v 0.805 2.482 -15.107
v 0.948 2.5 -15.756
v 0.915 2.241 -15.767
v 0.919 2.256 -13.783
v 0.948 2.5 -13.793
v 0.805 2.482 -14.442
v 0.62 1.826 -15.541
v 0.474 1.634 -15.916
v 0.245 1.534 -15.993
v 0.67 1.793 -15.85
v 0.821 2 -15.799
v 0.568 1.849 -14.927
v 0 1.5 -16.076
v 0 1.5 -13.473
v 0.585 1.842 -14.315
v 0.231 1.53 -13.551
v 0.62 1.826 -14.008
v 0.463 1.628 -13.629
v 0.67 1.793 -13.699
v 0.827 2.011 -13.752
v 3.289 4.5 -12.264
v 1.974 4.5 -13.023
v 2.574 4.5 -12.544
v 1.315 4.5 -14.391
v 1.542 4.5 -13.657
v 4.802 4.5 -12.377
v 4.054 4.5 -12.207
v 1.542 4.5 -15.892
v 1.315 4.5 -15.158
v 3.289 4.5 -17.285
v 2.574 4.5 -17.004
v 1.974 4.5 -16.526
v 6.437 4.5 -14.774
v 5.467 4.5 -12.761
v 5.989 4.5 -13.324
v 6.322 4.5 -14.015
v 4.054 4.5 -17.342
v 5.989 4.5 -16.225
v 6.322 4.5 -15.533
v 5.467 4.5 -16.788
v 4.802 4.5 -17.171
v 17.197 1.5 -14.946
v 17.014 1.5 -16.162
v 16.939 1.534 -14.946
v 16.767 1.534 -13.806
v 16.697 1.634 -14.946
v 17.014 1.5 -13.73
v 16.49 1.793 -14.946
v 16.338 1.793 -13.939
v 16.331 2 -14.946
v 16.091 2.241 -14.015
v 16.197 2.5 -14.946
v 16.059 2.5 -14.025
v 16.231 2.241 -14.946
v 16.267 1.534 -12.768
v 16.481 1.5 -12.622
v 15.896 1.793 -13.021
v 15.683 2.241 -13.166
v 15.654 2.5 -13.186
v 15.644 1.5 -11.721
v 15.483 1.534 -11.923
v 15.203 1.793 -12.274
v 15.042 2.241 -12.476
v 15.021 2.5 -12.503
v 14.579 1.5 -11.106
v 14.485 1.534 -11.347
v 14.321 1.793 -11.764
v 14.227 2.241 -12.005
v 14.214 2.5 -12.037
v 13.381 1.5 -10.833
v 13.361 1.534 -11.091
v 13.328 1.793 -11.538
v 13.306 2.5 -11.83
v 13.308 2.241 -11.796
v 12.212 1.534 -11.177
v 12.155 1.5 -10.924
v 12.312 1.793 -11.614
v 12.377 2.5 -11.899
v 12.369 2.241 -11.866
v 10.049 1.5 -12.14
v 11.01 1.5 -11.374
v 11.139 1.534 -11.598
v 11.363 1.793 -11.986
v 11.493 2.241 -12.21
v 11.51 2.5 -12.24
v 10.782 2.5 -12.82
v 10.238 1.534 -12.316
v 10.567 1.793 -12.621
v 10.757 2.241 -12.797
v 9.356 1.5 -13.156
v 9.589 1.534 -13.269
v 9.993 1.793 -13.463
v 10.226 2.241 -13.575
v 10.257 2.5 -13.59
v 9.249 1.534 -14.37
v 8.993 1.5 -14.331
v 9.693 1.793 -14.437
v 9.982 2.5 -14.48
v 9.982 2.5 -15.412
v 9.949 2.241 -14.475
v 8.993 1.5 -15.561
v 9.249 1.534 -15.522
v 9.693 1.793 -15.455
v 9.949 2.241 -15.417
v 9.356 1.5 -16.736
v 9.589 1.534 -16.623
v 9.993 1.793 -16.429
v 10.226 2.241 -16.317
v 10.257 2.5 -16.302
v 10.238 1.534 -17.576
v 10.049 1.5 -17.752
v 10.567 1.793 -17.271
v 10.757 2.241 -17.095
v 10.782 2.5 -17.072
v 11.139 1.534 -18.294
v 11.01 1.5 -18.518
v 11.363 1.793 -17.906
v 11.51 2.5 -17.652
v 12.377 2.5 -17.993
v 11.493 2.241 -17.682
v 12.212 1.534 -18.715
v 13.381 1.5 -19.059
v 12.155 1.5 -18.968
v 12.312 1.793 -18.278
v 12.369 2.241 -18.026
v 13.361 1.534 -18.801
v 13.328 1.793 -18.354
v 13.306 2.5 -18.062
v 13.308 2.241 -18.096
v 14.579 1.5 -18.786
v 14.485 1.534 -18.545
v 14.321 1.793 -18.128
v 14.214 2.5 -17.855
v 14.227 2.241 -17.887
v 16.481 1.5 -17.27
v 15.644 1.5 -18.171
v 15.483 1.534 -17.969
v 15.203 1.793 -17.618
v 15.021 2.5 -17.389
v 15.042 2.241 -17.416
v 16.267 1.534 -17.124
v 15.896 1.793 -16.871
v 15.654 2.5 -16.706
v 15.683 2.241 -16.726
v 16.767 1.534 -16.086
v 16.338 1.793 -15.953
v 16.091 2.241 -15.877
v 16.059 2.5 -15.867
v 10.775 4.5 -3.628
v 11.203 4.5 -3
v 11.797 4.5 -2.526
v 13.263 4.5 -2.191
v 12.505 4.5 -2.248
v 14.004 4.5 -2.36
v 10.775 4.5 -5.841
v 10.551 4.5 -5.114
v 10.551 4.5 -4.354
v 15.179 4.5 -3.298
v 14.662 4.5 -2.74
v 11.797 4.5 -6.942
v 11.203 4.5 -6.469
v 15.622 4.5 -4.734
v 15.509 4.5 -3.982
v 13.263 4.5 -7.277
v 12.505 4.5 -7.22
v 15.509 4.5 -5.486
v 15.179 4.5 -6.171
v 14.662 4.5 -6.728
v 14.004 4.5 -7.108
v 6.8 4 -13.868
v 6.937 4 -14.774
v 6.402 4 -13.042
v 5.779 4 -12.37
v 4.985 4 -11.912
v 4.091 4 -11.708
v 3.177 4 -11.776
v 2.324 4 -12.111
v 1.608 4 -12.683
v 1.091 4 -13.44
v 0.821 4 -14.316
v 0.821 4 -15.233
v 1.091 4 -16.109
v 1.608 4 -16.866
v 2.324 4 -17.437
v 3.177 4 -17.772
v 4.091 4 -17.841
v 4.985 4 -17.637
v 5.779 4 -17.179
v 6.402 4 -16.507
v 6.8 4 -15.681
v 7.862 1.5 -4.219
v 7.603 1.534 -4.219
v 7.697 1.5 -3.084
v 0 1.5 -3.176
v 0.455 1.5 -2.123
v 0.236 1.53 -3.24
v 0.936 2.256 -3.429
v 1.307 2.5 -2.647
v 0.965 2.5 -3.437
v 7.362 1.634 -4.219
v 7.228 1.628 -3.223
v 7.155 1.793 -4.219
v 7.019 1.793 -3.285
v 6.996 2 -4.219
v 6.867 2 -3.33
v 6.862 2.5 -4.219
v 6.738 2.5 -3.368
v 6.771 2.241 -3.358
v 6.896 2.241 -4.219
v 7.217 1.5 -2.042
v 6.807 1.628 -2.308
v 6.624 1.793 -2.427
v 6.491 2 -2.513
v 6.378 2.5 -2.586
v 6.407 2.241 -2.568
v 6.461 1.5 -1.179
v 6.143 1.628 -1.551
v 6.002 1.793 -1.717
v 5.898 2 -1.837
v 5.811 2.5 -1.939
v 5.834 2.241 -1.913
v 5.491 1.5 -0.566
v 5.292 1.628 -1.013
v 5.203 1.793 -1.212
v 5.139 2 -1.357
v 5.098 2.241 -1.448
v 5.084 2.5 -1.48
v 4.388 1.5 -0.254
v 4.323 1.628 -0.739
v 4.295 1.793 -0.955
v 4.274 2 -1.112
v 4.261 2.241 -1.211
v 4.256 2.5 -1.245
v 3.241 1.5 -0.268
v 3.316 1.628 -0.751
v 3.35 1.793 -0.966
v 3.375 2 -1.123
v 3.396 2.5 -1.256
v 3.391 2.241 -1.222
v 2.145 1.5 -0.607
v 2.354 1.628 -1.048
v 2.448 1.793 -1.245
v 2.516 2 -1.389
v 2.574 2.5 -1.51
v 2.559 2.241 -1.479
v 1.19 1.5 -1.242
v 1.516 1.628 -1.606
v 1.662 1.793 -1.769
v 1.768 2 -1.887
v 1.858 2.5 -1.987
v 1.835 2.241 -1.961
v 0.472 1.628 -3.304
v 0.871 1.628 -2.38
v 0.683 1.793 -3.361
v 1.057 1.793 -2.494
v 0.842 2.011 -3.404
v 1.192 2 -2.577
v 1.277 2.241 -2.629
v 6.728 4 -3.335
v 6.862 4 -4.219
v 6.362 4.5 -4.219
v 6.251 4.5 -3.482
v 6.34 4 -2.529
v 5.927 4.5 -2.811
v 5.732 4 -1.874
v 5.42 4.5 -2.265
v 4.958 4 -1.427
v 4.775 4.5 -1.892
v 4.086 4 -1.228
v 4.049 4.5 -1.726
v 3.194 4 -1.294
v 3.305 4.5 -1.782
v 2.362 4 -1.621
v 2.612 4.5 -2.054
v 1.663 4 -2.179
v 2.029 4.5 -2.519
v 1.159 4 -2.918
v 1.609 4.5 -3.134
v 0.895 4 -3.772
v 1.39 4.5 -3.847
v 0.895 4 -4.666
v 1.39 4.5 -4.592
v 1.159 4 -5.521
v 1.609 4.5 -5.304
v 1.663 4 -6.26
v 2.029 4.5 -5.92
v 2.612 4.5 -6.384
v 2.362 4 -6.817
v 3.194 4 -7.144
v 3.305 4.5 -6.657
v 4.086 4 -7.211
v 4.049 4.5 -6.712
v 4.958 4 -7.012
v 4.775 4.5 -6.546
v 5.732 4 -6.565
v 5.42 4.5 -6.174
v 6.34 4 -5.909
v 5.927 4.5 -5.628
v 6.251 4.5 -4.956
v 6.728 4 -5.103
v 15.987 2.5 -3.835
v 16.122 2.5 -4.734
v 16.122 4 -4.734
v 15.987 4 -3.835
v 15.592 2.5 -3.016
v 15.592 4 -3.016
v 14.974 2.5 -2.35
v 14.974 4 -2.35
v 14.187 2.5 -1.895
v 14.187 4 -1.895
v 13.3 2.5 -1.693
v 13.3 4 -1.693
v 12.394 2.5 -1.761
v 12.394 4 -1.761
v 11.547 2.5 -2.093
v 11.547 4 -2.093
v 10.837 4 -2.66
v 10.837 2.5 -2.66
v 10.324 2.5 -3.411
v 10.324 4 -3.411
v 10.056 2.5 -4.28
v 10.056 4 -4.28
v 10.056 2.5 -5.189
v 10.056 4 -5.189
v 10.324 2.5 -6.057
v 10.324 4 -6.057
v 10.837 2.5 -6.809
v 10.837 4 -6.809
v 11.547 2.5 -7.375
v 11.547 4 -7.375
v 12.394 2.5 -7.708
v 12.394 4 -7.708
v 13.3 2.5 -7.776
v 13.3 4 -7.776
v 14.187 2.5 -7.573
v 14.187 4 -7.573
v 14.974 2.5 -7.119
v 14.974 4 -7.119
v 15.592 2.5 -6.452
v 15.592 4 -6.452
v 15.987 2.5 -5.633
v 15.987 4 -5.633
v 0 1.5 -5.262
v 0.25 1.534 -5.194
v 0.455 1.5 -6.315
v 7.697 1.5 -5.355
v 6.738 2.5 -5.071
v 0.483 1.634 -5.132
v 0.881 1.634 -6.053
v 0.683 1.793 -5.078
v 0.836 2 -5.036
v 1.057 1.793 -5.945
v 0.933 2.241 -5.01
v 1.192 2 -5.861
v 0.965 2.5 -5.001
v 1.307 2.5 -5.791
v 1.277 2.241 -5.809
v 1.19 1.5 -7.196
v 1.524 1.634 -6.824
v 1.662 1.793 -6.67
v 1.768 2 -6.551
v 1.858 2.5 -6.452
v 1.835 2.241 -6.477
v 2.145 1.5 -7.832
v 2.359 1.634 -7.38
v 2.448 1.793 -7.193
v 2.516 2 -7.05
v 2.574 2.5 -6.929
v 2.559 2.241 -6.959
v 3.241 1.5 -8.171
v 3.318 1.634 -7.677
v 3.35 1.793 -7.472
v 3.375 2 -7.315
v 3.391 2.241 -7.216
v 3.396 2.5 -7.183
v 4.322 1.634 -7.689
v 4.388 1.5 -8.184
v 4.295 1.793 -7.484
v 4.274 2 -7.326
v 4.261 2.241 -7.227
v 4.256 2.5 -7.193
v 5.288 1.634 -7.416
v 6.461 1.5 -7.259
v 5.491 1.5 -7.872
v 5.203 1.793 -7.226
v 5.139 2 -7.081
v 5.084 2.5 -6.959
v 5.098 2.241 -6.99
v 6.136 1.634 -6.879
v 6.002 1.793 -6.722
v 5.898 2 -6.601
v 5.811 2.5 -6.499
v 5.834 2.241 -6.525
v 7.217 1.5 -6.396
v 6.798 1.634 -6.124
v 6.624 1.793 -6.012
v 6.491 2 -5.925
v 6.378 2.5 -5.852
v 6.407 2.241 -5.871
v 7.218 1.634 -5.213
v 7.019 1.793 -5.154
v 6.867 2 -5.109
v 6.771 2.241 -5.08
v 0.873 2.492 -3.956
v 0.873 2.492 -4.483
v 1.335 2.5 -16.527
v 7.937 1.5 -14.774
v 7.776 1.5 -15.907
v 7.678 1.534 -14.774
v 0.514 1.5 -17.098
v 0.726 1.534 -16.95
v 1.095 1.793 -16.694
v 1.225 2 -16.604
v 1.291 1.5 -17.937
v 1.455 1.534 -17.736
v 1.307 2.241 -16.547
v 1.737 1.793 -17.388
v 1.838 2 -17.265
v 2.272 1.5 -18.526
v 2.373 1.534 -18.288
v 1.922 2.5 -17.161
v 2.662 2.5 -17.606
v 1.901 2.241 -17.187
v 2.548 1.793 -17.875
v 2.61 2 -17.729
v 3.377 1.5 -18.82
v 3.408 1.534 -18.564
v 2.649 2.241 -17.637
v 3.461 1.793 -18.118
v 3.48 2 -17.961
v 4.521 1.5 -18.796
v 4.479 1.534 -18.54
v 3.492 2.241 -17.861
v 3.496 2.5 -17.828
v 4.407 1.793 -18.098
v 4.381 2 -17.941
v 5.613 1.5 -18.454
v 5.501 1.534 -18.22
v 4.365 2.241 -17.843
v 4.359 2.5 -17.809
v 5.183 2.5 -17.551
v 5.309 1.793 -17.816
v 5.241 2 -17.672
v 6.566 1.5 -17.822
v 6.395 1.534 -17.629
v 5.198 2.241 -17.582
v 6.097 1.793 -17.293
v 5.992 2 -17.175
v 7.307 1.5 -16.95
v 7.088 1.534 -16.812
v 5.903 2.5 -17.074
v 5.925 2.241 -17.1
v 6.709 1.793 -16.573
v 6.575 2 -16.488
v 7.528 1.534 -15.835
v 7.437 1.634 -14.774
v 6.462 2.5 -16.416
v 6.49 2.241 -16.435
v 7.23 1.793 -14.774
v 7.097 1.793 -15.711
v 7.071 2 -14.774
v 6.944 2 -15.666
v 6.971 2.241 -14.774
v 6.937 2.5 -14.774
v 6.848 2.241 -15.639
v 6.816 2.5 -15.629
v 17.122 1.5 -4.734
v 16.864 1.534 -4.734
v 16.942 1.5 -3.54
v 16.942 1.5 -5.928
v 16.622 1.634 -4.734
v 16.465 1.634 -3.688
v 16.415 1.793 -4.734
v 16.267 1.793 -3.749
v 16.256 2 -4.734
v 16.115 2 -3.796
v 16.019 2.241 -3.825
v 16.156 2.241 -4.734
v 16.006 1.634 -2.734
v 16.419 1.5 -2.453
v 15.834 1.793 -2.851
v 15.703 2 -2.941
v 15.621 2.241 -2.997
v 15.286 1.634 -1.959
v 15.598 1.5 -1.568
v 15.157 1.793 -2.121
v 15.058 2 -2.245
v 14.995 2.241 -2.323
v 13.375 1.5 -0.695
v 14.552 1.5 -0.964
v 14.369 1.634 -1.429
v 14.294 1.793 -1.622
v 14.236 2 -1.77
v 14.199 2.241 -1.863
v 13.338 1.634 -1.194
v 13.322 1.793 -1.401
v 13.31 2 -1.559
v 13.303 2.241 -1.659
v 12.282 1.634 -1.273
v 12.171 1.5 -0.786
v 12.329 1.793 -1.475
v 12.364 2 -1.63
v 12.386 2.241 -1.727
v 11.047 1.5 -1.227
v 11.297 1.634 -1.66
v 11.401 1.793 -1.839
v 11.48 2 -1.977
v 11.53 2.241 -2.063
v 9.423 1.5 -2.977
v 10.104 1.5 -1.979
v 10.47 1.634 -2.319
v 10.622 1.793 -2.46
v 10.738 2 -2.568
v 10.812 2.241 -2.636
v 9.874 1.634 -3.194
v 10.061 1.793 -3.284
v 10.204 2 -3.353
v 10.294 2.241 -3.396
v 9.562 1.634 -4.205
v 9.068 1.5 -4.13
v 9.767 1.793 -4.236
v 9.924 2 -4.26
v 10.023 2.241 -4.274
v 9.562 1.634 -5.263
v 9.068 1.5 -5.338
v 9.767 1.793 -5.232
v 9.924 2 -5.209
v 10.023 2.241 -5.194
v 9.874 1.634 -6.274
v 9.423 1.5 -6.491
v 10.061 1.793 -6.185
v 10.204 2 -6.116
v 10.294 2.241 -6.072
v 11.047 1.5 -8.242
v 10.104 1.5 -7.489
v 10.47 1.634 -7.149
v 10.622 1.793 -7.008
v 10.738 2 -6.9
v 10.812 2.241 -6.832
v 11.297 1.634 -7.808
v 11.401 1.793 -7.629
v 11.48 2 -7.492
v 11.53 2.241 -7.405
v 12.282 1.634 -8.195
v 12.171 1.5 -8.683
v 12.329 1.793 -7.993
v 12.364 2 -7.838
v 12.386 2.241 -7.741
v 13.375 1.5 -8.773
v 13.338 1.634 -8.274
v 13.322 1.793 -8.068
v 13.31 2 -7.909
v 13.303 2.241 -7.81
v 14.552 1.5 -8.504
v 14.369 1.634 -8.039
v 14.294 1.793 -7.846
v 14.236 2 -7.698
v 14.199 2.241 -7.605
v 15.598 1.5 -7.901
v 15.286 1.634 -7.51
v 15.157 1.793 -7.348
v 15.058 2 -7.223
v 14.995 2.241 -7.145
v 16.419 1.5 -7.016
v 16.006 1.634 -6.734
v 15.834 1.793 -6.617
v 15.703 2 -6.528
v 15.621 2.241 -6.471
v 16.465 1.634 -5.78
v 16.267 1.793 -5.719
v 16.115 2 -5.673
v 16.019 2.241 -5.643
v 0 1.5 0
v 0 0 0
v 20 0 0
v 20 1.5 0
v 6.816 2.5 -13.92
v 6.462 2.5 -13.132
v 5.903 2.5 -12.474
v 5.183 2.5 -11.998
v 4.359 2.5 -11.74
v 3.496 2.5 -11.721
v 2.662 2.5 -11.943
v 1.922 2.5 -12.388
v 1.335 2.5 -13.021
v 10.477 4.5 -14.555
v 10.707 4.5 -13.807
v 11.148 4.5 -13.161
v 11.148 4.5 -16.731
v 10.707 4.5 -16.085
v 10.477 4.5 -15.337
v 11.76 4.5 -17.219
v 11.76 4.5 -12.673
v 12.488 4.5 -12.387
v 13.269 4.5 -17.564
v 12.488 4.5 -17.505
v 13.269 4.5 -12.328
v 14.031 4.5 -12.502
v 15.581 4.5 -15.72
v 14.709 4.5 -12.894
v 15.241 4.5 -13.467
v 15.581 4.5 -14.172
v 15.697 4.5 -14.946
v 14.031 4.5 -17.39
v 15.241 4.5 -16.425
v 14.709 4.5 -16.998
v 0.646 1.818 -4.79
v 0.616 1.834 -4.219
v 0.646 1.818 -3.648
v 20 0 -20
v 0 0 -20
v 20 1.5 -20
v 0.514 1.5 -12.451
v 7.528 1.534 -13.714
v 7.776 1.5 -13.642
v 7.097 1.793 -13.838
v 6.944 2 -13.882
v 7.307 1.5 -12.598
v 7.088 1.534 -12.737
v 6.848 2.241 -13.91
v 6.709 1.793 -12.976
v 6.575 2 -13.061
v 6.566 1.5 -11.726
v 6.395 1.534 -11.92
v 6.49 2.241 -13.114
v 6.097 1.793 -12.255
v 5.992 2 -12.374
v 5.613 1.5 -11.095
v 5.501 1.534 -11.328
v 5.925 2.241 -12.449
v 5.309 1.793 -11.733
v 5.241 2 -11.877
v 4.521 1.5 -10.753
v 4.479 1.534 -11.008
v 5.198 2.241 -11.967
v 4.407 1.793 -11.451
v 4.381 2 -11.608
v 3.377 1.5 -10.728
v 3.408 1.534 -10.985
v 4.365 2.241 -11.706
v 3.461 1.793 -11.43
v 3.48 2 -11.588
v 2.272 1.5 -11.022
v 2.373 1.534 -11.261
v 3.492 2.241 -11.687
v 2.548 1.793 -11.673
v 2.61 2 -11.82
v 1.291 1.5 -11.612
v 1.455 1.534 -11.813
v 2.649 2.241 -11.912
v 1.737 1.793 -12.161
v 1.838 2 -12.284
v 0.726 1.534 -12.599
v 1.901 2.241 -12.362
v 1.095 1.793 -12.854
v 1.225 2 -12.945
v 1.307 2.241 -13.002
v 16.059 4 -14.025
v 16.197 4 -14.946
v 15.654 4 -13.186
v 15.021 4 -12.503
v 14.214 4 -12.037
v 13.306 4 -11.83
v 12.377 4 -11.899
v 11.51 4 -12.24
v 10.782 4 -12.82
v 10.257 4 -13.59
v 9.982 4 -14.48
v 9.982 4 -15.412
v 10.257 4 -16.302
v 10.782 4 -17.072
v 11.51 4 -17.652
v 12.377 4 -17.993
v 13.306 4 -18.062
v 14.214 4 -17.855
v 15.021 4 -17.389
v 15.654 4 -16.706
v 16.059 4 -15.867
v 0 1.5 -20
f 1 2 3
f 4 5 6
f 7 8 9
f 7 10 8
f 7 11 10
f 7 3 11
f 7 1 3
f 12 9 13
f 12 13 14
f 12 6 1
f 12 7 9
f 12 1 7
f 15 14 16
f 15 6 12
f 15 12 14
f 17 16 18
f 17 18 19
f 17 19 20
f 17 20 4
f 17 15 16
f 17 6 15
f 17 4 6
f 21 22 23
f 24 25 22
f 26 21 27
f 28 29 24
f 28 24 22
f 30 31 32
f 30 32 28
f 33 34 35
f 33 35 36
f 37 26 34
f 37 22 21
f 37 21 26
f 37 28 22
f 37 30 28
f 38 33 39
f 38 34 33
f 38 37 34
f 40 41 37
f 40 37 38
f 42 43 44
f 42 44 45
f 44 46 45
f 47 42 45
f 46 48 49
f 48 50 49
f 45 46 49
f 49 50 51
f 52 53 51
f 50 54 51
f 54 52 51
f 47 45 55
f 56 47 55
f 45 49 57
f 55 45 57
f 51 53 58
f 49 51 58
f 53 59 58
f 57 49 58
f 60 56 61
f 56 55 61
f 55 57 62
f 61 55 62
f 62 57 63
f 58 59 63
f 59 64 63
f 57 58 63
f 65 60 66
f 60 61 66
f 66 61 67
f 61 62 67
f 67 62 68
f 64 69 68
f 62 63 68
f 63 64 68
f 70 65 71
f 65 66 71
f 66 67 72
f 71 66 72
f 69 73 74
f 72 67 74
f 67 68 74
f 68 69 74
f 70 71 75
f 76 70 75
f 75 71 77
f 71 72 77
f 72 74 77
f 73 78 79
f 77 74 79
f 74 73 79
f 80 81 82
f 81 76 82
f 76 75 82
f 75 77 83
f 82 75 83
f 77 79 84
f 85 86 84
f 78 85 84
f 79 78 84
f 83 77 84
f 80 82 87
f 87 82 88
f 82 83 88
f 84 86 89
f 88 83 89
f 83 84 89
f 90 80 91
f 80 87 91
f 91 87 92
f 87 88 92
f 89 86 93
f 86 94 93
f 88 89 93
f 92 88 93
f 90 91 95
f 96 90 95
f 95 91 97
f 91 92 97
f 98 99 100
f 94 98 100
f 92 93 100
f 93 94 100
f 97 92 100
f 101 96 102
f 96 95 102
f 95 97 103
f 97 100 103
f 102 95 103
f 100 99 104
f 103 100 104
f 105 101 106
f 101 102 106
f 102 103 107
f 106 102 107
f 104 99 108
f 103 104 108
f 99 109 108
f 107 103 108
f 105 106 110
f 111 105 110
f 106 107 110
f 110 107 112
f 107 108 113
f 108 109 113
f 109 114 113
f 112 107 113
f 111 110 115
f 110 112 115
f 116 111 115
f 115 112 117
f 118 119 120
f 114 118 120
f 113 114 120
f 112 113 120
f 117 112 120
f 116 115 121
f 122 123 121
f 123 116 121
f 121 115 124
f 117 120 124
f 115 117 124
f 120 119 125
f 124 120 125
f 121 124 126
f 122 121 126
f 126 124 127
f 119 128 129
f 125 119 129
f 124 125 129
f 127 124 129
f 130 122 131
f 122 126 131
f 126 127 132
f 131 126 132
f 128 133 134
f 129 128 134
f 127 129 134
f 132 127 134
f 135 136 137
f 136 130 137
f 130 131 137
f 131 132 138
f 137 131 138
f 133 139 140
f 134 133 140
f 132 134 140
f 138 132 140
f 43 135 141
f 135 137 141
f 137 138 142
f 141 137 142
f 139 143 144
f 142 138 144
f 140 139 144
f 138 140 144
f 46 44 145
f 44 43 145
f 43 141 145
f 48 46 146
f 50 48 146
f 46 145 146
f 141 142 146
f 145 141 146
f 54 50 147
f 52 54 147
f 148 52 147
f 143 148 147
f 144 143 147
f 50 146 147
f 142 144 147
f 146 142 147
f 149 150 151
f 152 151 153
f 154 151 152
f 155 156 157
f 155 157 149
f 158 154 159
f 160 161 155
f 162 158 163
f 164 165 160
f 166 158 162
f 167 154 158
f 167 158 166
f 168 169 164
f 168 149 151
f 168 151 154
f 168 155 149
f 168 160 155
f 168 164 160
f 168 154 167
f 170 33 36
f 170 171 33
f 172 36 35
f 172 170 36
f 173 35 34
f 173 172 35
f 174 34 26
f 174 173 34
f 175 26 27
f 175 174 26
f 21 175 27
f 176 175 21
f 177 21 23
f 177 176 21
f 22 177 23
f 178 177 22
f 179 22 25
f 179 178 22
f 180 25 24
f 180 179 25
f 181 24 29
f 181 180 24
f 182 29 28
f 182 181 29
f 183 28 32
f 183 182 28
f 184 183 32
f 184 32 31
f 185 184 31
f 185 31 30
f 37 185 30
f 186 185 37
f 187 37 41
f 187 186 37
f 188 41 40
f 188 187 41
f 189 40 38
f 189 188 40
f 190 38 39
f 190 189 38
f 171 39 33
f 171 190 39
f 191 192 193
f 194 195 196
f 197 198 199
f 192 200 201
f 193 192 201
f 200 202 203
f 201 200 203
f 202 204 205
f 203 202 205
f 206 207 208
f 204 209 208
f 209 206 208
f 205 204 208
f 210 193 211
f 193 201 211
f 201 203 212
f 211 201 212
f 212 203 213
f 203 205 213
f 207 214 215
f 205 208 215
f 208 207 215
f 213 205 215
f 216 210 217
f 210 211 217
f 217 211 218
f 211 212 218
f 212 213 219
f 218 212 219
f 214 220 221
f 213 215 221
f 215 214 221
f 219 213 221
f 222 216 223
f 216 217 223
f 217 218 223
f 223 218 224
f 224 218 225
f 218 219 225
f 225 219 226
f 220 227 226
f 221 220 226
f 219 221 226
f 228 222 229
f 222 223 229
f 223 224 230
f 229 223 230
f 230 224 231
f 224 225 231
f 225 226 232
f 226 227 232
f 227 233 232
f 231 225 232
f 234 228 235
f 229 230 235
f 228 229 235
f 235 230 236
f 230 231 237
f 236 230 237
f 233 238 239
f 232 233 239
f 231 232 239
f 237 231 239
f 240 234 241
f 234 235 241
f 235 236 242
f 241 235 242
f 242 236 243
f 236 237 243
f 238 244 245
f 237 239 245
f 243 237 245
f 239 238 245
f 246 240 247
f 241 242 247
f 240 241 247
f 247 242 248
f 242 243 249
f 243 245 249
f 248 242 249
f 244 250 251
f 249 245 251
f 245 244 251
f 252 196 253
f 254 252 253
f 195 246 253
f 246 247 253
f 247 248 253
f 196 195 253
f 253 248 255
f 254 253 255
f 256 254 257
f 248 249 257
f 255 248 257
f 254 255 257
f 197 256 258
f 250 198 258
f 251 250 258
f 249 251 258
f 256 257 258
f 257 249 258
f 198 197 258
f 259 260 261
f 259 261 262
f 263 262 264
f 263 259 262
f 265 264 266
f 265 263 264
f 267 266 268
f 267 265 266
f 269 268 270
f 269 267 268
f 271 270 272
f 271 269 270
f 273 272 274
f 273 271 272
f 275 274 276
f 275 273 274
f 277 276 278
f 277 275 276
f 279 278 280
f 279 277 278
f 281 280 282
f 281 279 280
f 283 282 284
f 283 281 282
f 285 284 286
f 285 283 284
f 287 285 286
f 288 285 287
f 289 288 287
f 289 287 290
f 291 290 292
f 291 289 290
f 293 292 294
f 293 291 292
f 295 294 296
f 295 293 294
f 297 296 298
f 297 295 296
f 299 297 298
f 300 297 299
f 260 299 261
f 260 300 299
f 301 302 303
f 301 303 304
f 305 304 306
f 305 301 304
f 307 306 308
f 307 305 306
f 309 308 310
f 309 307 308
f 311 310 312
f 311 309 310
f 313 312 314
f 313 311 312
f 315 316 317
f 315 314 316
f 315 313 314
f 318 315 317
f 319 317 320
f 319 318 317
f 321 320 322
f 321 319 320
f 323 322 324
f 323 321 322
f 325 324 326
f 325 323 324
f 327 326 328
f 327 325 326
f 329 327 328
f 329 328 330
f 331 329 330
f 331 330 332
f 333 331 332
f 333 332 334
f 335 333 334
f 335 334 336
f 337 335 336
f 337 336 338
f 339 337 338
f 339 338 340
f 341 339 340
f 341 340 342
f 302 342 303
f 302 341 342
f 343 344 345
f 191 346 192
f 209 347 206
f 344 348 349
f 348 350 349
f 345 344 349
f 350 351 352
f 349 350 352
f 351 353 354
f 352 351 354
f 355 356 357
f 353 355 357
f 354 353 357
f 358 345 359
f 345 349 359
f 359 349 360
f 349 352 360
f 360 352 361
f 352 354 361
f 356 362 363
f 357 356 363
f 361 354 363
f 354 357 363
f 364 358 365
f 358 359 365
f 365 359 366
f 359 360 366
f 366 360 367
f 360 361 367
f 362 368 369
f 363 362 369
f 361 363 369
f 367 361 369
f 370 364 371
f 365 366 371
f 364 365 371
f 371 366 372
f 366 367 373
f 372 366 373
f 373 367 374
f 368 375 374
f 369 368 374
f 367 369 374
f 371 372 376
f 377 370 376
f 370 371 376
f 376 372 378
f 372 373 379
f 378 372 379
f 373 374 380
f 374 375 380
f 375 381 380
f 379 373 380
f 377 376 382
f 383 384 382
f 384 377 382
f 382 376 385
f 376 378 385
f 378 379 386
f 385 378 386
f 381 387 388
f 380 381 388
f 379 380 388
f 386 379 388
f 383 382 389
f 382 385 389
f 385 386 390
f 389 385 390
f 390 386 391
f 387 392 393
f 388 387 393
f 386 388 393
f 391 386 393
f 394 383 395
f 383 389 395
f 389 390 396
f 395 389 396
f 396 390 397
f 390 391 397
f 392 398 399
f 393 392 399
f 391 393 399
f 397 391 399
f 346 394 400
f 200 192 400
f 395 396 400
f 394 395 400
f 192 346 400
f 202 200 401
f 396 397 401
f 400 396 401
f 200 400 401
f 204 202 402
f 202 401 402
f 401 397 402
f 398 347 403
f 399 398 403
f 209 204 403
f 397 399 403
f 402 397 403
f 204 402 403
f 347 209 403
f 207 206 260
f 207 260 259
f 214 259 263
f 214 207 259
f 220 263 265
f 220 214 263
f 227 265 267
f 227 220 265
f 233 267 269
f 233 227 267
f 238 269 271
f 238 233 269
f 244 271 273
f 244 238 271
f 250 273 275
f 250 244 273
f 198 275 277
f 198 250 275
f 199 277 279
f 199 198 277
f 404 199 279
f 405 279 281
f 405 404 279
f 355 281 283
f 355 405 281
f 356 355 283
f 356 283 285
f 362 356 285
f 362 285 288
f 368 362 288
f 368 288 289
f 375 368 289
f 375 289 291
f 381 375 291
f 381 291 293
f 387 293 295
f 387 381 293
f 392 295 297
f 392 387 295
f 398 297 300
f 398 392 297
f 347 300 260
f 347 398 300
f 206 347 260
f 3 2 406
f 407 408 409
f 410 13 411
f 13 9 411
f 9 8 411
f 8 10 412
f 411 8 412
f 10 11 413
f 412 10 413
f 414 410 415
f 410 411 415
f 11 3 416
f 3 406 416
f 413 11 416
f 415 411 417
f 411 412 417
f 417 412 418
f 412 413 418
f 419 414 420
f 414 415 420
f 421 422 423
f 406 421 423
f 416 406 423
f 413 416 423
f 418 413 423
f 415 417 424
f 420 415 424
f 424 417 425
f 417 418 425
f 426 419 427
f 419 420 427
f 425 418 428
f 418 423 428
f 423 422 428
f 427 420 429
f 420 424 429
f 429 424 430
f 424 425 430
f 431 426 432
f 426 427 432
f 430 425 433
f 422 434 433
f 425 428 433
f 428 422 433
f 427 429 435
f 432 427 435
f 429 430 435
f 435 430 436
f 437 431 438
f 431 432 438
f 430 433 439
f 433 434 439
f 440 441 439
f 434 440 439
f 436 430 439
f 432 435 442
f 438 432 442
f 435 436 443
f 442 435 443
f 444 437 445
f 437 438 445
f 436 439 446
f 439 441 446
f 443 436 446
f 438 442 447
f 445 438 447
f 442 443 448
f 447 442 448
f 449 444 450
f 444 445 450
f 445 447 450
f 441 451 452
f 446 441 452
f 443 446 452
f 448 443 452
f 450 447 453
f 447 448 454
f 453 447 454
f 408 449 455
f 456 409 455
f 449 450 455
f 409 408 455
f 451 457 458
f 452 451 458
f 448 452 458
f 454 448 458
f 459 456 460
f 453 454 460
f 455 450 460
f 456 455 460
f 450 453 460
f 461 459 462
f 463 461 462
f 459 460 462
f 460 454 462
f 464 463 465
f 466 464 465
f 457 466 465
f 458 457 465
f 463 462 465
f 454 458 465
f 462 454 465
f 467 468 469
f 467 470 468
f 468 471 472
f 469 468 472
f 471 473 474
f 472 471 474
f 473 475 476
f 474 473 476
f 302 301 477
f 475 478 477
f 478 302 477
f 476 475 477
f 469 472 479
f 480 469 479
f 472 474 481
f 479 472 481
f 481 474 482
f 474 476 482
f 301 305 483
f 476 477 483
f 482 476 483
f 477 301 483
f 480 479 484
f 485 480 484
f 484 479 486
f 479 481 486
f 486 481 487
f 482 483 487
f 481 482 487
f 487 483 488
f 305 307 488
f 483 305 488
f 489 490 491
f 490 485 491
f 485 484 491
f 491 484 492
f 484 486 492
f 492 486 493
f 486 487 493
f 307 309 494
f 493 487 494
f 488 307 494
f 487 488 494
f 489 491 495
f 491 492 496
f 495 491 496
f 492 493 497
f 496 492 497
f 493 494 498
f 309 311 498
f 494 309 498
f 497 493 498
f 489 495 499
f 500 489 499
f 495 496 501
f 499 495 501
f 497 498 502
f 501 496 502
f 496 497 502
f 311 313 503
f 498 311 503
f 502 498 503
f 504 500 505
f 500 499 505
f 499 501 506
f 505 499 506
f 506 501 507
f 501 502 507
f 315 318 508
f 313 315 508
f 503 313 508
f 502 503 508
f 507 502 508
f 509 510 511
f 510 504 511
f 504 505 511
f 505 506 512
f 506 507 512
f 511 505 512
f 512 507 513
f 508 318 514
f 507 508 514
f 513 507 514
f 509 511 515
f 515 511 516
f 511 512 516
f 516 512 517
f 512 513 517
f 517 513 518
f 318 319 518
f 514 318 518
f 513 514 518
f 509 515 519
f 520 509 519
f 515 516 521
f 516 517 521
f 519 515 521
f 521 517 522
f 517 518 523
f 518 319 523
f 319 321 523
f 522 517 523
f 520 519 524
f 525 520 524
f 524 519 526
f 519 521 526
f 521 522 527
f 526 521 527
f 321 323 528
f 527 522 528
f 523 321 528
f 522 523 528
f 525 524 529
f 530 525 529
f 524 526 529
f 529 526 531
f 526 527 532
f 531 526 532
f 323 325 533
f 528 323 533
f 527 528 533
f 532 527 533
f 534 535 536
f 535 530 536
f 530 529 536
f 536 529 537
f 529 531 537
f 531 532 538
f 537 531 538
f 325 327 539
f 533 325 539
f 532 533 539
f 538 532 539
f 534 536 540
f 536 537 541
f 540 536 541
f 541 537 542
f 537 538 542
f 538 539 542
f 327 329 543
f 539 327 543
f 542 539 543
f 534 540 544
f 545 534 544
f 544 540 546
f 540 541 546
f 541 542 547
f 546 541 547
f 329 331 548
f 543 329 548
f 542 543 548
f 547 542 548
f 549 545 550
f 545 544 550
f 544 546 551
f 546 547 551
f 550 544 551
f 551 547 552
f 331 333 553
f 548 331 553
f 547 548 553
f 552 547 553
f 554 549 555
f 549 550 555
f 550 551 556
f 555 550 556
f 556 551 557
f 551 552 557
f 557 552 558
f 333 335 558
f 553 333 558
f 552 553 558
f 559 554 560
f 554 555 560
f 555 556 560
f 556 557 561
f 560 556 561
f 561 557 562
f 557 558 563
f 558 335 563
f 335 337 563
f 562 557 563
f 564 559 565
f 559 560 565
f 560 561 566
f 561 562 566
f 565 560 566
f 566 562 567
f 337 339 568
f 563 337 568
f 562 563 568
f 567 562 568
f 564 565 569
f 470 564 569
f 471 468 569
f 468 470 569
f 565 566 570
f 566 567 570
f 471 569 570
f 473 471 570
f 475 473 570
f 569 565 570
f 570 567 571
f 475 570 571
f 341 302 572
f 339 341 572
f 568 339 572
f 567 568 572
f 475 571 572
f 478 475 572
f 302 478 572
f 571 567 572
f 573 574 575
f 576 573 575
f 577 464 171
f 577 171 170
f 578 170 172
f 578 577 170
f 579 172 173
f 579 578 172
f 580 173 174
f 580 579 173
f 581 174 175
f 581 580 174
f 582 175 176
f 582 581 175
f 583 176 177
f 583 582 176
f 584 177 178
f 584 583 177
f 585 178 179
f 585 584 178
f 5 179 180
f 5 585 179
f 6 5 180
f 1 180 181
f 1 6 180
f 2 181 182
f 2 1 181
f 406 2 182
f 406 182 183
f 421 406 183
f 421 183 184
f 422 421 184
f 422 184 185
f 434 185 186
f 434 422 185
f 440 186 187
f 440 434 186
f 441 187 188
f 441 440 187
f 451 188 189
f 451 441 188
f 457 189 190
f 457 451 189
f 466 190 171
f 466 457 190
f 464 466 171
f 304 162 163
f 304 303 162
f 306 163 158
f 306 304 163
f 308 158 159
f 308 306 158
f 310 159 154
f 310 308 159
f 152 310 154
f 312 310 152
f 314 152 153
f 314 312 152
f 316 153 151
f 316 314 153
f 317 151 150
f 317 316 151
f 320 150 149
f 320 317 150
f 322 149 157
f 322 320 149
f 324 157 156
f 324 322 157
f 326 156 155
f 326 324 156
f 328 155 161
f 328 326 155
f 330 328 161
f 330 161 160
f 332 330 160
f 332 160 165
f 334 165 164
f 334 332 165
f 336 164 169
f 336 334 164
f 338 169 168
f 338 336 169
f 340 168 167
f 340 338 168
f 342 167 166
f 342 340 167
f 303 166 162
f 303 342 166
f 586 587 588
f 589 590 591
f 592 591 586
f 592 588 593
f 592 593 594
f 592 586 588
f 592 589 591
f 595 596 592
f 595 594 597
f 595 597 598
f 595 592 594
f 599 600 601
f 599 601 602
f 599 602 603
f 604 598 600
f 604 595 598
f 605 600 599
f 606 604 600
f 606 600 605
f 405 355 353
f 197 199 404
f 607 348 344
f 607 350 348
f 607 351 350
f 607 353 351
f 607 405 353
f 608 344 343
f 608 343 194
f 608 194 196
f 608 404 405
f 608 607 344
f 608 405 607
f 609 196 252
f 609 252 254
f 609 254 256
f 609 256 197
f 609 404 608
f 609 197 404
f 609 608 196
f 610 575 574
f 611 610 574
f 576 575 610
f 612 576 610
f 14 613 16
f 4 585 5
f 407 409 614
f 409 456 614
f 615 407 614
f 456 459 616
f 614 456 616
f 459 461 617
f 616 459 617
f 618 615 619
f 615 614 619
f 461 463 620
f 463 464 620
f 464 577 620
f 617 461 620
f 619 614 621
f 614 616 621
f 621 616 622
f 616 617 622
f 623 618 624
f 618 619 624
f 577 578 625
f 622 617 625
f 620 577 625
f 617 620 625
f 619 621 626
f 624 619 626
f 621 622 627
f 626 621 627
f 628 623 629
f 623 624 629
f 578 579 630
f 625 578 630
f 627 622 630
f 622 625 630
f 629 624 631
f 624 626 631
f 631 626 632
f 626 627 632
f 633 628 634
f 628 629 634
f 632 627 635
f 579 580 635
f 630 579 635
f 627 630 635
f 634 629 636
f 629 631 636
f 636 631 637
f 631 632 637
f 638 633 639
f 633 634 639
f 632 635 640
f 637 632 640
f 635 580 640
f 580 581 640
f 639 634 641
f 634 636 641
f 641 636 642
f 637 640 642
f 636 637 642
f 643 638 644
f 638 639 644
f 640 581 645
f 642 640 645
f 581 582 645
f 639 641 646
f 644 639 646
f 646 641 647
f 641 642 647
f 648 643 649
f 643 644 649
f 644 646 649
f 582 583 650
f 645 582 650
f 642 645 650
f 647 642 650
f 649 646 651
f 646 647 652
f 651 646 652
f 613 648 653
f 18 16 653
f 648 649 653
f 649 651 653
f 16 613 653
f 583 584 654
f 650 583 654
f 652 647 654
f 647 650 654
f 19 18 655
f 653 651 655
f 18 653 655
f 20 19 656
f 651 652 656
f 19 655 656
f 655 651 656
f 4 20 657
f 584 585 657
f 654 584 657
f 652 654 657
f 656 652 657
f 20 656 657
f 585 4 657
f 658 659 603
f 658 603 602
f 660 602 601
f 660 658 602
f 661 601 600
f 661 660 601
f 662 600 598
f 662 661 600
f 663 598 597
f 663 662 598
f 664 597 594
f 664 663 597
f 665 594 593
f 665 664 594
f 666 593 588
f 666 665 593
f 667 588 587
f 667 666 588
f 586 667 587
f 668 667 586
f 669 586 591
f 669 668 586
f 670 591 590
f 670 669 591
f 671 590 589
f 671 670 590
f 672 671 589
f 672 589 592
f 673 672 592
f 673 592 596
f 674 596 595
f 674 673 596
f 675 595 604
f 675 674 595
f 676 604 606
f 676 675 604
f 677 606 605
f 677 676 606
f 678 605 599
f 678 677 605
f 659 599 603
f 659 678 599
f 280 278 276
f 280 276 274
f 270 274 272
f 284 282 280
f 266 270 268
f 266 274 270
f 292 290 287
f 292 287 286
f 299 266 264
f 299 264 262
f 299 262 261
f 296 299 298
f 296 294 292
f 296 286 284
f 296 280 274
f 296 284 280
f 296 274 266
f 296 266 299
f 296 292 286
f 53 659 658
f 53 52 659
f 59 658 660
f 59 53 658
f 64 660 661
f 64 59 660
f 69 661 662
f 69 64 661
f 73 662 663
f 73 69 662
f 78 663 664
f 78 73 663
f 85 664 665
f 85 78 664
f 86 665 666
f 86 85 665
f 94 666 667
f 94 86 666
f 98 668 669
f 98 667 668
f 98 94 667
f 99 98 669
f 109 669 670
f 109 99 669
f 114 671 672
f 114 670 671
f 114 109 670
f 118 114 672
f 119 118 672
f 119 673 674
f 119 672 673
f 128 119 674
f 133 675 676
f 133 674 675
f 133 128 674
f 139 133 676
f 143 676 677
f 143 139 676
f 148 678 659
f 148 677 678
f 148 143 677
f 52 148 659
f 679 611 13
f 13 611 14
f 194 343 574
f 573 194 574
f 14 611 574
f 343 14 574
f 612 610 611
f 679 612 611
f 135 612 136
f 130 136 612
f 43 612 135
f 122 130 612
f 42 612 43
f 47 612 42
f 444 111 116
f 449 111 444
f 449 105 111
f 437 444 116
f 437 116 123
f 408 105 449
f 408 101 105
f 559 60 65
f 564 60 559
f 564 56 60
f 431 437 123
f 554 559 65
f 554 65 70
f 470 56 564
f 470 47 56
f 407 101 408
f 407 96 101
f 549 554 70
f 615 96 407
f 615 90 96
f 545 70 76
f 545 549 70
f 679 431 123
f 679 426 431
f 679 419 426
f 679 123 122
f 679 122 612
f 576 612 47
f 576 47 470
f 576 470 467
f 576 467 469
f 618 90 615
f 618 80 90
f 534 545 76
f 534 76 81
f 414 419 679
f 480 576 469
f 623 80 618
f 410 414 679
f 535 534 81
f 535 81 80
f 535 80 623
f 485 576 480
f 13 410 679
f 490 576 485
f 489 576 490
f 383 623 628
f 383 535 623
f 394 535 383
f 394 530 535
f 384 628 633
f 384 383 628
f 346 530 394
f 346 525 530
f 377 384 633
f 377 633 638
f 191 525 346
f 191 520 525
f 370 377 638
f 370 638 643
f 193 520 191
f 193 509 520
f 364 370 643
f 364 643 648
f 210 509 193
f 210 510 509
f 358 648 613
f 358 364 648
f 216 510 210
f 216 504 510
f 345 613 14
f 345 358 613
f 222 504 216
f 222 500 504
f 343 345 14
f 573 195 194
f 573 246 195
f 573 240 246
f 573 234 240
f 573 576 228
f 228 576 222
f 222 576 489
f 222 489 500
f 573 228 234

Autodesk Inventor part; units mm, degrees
ref_plane "YZ Plane" through (0, 0, 0) normal (1, 0, 0) x (0, 1, 0)
ref_plane "XZ Plane" through (0, 0, 0) normal (0, 1, 0) x (-1, 0, 0)
ref_plane "XY Plane" through (0, 0, 0) normal (0, 0, 1) x (1, 0, 0)
sketch "Sketch2" plane through (0, 0, 0) normal (0, 1, 0) x (-1, 0, 0)
  line L0 (0, 0) -> (-20, 0)
  line L1 (-20, 0) -> (-20, -20)
  line L2 (-20, -20) -> (0, -20)
  line L3 (0, -20) -> (0, 0)
  dimension "d0" = 20
  dimension "d1" = 20
extrude "Extrusion1" add sketch "Sketch2" along normal blind 1.5
sketch "Sketch3" plane through (0, 1.5, 0) normal (0, 1, 0) x (1, 0, 0)
  circle A0 centre (3.8617, 4.2192) radius 3
  circle A1 centre (13.0724, 4.7341) radius 3.05
  circle A2 centre (3.8617, 14.7744) radius 3.075
  circle A3 centre (13.0724, 14.946) radius 3.125
  point P0 (0, 0)
  dimension "d4" = 6
  dimension "d5" = 6.1
  dimension "d6" = 6.15
  dimension "d7" = 6.25
extrude "Extrusion2" add sketch "Sketch3" along normal blind 3
fillet "Fillet1" radius 1 4 edges at (10.0224, 1.5, -4.7341) (0.8617, 1.5, -4.2192) (0.7867, 1.5, -14.7744) (9.9474, 1.5, -14.946)
chamfer "Chamfer1" distance 0.5 angle 45 4 edges at (10.0224, 4.5, -4.7341) (9.9474, 4.5, -14.946) (0.7867, 4.5, -14.7744) (0.8617, 4.5, -4.2192)
properties part number "heligearPressFitTester"
